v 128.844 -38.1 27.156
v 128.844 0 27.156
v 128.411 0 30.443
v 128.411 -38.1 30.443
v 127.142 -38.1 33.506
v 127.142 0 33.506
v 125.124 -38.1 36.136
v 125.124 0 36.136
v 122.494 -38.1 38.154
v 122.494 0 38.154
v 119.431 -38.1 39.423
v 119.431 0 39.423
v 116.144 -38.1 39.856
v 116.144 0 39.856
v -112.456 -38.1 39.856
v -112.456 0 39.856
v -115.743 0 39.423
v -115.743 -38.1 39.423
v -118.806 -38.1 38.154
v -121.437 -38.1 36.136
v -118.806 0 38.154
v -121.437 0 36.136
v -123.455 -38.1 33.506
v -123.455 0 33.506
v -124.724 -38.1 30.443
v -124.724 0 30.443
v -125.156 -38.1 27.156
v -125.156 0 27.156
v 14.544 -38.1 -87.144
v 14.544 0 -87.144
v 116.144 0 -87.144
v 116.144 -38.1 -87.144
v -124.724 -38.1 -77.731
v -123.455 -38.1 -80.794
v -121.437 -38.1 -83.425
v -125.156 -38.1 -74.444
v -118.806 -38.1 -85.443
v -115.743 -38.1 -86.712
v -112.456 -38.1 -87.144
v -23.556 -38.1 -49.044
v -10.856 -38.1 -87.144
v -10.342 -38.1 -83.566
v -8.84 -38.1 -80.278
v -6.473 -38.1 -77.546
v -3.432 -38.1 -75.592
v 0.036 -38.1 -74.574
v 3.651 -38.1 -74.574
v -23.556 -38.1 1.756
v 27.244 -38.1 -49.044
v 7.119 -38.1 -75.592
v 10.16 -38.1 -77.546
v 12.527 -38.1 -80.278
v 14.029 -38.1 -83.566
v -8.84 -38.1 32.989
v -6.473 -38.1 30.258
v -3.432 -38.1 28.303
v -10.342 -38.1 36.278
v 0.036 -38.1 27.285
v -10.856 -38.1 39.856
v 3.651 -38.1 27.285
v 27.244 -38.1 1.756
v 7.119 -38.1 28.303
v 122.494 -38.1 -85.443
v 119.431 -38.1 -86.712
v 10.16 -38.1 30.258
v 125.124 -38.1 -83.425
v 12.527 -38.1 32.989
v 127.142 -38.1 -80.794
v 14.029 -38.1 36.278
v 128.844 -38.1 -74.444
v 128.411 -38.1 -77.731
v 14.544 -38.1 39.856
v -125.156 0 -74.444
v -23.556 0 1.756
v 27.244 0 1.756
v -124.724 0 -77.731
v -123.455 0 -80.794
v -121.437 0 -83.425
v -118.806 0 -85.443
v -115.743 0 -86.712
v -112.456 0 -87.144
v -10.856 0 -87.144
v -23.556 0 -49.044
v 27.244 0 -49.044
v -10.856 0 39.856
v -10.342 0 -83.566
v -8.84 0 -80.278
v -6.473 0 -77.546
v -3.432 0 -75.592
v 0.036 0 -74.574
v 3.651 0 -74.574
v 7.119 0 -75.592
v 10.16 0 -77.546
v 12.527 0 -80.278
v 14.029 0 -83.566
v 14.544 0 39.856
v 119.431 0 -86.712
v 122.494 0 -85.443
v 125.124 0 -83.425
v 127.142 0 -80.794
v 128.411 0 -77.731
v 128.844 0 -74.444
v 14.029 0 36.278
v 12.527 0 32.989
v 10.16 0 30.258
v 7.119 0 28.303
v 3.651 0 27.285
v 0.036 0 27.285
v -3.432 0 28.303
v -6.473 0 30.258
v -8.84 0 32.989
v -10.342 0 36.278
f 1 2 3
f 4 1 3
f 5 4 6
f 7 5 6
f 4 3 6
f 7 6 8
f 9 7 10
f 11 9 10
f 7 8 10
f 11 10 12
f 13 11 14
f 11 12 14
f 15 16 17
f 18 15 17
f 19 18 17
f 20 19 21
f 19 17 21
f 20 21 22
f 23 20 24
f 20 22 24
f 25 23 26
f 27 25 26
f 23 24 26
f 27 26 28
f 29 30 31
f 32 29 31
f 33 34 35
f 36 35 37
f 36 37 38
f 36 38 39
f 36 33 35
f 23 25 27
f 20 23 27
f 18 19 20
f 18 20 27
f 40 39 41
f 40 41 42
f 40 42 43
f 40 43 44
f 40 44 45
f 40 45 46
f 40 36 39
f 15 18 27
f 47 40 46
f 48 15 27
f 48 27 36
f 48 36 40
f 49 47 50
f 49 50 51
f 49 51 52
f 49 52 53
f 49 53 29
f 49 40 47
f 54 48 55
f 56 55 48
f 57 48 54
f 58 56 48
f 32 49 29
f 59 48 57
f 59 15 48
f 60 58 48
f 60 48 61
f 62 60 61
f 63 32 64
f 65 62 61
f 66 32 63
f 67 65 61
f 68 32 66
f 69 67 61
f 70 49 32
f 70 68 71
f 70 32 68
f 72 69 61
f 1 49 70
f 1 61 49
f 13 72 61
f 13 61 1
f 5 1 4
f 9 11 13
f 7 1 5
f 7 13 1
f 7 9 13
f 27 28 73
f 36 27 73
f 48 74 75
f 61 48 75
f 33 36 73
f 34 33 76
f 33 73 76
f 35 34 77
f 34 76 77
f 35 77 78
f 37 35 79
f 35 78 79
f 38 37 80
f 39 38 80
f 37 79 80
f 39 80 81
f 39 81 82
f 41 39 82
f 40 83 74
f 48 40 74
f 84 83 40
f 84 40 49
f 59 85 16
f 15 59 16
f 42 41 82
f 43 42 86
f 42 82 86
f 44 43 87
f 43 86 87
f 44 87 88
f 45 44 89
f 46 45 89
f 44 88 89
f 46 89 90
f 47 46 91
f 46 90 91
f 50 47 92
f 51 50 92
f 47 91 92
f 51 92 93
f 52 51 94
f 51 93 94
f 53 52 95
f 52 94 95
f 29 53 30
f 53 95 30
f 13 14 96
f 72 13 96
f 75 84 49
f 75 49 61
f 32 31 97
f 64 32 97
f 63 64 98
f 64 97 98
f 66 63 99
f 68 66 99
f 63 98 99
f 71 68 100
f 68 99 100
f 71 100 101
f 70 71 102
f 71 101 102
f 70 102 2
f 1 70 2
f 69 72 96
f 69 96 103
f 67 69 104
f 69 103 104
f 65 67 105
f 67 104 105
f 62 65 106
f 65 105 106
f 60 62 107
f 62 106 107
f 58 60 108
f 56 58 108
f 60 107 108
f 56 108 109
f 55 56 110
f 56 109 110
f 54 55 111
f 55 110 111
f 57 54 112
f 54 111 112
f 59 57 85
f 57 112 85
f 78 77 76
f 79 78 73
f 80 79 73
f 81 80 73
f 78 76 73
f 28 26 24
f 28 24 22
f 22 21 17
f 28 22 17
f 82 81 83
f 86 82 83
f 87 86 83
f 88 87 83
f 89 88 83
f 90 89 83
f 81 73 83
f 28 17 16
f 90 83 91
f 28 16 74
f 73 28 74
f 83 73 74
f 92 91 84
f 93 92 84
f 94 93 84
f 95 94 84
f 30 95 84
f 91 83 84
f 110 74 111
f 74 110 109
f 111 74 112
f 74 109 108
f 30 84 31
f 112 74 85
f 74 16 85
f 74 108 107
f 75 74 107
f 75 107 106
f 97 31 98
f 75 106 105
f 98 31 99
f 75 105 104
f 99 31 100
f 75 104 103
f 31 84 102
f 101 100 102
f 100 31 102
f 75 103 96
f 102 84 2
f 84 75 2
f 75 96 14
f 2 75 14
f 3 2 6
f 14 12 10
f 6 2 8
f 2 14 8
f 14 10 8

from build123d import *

# Parameters (mm, degrees)
F0_W     = 50.8
F0_H     = 50.8
F1_DEPTH = 38.1


with BuildPart() as f1:
    # F0 (on Front) → F1 (new body)
    with BuildSketch(Plane.XZ):
        with BuildLine():
            Line((-10.856453, 39.855531), (-112.456453, 39.855531))
            ThreePointArc((-112.456453, 39.855531), (-121.436709, 36.135787), (-125.156453, 27.155531))
            Line((-125.156453, 27.155531), (-125.156453, -74.444469))
            ThreePointArc((-125.156453, -74.444469), (-121.436709, -83.424726), (-112.456453, -87.144469))
            Line((-112.456453, -87.144469), (-10.856453, -87.144469))
            ThreePointArc((-10.856453, -87.144469), (1.843547, -74.444469), (14.543547, -87.144469))
            Line((14.543547, -87.144469), (116.143547, -87.144469))
            ThreePointArc((116.143547, -87.144469), (125.123804, -83.424726), (128.843547, -74.444469))
            Line((128.843547, -74.444469), (128.843547, 27.155531))
            ThreePointArc((128.843547, 27.155531), (125.123804, 36.135787), (116.143547, 39.855531))
            Line((116.143547, 39.855531), (14.543547, 39.855531))
            ThreePointArc((14.543547, 39.855531), (1.843547, 27.155531), (-10.856453, 39.855531))
        make_face()
        with Locations((1.843547, -23.644469)):
            Rectangle(F0_W, F0_H, mode=Mode.SUBTRACT)
    extrude(amount=F1_DEPTH)


solid = f1.part
